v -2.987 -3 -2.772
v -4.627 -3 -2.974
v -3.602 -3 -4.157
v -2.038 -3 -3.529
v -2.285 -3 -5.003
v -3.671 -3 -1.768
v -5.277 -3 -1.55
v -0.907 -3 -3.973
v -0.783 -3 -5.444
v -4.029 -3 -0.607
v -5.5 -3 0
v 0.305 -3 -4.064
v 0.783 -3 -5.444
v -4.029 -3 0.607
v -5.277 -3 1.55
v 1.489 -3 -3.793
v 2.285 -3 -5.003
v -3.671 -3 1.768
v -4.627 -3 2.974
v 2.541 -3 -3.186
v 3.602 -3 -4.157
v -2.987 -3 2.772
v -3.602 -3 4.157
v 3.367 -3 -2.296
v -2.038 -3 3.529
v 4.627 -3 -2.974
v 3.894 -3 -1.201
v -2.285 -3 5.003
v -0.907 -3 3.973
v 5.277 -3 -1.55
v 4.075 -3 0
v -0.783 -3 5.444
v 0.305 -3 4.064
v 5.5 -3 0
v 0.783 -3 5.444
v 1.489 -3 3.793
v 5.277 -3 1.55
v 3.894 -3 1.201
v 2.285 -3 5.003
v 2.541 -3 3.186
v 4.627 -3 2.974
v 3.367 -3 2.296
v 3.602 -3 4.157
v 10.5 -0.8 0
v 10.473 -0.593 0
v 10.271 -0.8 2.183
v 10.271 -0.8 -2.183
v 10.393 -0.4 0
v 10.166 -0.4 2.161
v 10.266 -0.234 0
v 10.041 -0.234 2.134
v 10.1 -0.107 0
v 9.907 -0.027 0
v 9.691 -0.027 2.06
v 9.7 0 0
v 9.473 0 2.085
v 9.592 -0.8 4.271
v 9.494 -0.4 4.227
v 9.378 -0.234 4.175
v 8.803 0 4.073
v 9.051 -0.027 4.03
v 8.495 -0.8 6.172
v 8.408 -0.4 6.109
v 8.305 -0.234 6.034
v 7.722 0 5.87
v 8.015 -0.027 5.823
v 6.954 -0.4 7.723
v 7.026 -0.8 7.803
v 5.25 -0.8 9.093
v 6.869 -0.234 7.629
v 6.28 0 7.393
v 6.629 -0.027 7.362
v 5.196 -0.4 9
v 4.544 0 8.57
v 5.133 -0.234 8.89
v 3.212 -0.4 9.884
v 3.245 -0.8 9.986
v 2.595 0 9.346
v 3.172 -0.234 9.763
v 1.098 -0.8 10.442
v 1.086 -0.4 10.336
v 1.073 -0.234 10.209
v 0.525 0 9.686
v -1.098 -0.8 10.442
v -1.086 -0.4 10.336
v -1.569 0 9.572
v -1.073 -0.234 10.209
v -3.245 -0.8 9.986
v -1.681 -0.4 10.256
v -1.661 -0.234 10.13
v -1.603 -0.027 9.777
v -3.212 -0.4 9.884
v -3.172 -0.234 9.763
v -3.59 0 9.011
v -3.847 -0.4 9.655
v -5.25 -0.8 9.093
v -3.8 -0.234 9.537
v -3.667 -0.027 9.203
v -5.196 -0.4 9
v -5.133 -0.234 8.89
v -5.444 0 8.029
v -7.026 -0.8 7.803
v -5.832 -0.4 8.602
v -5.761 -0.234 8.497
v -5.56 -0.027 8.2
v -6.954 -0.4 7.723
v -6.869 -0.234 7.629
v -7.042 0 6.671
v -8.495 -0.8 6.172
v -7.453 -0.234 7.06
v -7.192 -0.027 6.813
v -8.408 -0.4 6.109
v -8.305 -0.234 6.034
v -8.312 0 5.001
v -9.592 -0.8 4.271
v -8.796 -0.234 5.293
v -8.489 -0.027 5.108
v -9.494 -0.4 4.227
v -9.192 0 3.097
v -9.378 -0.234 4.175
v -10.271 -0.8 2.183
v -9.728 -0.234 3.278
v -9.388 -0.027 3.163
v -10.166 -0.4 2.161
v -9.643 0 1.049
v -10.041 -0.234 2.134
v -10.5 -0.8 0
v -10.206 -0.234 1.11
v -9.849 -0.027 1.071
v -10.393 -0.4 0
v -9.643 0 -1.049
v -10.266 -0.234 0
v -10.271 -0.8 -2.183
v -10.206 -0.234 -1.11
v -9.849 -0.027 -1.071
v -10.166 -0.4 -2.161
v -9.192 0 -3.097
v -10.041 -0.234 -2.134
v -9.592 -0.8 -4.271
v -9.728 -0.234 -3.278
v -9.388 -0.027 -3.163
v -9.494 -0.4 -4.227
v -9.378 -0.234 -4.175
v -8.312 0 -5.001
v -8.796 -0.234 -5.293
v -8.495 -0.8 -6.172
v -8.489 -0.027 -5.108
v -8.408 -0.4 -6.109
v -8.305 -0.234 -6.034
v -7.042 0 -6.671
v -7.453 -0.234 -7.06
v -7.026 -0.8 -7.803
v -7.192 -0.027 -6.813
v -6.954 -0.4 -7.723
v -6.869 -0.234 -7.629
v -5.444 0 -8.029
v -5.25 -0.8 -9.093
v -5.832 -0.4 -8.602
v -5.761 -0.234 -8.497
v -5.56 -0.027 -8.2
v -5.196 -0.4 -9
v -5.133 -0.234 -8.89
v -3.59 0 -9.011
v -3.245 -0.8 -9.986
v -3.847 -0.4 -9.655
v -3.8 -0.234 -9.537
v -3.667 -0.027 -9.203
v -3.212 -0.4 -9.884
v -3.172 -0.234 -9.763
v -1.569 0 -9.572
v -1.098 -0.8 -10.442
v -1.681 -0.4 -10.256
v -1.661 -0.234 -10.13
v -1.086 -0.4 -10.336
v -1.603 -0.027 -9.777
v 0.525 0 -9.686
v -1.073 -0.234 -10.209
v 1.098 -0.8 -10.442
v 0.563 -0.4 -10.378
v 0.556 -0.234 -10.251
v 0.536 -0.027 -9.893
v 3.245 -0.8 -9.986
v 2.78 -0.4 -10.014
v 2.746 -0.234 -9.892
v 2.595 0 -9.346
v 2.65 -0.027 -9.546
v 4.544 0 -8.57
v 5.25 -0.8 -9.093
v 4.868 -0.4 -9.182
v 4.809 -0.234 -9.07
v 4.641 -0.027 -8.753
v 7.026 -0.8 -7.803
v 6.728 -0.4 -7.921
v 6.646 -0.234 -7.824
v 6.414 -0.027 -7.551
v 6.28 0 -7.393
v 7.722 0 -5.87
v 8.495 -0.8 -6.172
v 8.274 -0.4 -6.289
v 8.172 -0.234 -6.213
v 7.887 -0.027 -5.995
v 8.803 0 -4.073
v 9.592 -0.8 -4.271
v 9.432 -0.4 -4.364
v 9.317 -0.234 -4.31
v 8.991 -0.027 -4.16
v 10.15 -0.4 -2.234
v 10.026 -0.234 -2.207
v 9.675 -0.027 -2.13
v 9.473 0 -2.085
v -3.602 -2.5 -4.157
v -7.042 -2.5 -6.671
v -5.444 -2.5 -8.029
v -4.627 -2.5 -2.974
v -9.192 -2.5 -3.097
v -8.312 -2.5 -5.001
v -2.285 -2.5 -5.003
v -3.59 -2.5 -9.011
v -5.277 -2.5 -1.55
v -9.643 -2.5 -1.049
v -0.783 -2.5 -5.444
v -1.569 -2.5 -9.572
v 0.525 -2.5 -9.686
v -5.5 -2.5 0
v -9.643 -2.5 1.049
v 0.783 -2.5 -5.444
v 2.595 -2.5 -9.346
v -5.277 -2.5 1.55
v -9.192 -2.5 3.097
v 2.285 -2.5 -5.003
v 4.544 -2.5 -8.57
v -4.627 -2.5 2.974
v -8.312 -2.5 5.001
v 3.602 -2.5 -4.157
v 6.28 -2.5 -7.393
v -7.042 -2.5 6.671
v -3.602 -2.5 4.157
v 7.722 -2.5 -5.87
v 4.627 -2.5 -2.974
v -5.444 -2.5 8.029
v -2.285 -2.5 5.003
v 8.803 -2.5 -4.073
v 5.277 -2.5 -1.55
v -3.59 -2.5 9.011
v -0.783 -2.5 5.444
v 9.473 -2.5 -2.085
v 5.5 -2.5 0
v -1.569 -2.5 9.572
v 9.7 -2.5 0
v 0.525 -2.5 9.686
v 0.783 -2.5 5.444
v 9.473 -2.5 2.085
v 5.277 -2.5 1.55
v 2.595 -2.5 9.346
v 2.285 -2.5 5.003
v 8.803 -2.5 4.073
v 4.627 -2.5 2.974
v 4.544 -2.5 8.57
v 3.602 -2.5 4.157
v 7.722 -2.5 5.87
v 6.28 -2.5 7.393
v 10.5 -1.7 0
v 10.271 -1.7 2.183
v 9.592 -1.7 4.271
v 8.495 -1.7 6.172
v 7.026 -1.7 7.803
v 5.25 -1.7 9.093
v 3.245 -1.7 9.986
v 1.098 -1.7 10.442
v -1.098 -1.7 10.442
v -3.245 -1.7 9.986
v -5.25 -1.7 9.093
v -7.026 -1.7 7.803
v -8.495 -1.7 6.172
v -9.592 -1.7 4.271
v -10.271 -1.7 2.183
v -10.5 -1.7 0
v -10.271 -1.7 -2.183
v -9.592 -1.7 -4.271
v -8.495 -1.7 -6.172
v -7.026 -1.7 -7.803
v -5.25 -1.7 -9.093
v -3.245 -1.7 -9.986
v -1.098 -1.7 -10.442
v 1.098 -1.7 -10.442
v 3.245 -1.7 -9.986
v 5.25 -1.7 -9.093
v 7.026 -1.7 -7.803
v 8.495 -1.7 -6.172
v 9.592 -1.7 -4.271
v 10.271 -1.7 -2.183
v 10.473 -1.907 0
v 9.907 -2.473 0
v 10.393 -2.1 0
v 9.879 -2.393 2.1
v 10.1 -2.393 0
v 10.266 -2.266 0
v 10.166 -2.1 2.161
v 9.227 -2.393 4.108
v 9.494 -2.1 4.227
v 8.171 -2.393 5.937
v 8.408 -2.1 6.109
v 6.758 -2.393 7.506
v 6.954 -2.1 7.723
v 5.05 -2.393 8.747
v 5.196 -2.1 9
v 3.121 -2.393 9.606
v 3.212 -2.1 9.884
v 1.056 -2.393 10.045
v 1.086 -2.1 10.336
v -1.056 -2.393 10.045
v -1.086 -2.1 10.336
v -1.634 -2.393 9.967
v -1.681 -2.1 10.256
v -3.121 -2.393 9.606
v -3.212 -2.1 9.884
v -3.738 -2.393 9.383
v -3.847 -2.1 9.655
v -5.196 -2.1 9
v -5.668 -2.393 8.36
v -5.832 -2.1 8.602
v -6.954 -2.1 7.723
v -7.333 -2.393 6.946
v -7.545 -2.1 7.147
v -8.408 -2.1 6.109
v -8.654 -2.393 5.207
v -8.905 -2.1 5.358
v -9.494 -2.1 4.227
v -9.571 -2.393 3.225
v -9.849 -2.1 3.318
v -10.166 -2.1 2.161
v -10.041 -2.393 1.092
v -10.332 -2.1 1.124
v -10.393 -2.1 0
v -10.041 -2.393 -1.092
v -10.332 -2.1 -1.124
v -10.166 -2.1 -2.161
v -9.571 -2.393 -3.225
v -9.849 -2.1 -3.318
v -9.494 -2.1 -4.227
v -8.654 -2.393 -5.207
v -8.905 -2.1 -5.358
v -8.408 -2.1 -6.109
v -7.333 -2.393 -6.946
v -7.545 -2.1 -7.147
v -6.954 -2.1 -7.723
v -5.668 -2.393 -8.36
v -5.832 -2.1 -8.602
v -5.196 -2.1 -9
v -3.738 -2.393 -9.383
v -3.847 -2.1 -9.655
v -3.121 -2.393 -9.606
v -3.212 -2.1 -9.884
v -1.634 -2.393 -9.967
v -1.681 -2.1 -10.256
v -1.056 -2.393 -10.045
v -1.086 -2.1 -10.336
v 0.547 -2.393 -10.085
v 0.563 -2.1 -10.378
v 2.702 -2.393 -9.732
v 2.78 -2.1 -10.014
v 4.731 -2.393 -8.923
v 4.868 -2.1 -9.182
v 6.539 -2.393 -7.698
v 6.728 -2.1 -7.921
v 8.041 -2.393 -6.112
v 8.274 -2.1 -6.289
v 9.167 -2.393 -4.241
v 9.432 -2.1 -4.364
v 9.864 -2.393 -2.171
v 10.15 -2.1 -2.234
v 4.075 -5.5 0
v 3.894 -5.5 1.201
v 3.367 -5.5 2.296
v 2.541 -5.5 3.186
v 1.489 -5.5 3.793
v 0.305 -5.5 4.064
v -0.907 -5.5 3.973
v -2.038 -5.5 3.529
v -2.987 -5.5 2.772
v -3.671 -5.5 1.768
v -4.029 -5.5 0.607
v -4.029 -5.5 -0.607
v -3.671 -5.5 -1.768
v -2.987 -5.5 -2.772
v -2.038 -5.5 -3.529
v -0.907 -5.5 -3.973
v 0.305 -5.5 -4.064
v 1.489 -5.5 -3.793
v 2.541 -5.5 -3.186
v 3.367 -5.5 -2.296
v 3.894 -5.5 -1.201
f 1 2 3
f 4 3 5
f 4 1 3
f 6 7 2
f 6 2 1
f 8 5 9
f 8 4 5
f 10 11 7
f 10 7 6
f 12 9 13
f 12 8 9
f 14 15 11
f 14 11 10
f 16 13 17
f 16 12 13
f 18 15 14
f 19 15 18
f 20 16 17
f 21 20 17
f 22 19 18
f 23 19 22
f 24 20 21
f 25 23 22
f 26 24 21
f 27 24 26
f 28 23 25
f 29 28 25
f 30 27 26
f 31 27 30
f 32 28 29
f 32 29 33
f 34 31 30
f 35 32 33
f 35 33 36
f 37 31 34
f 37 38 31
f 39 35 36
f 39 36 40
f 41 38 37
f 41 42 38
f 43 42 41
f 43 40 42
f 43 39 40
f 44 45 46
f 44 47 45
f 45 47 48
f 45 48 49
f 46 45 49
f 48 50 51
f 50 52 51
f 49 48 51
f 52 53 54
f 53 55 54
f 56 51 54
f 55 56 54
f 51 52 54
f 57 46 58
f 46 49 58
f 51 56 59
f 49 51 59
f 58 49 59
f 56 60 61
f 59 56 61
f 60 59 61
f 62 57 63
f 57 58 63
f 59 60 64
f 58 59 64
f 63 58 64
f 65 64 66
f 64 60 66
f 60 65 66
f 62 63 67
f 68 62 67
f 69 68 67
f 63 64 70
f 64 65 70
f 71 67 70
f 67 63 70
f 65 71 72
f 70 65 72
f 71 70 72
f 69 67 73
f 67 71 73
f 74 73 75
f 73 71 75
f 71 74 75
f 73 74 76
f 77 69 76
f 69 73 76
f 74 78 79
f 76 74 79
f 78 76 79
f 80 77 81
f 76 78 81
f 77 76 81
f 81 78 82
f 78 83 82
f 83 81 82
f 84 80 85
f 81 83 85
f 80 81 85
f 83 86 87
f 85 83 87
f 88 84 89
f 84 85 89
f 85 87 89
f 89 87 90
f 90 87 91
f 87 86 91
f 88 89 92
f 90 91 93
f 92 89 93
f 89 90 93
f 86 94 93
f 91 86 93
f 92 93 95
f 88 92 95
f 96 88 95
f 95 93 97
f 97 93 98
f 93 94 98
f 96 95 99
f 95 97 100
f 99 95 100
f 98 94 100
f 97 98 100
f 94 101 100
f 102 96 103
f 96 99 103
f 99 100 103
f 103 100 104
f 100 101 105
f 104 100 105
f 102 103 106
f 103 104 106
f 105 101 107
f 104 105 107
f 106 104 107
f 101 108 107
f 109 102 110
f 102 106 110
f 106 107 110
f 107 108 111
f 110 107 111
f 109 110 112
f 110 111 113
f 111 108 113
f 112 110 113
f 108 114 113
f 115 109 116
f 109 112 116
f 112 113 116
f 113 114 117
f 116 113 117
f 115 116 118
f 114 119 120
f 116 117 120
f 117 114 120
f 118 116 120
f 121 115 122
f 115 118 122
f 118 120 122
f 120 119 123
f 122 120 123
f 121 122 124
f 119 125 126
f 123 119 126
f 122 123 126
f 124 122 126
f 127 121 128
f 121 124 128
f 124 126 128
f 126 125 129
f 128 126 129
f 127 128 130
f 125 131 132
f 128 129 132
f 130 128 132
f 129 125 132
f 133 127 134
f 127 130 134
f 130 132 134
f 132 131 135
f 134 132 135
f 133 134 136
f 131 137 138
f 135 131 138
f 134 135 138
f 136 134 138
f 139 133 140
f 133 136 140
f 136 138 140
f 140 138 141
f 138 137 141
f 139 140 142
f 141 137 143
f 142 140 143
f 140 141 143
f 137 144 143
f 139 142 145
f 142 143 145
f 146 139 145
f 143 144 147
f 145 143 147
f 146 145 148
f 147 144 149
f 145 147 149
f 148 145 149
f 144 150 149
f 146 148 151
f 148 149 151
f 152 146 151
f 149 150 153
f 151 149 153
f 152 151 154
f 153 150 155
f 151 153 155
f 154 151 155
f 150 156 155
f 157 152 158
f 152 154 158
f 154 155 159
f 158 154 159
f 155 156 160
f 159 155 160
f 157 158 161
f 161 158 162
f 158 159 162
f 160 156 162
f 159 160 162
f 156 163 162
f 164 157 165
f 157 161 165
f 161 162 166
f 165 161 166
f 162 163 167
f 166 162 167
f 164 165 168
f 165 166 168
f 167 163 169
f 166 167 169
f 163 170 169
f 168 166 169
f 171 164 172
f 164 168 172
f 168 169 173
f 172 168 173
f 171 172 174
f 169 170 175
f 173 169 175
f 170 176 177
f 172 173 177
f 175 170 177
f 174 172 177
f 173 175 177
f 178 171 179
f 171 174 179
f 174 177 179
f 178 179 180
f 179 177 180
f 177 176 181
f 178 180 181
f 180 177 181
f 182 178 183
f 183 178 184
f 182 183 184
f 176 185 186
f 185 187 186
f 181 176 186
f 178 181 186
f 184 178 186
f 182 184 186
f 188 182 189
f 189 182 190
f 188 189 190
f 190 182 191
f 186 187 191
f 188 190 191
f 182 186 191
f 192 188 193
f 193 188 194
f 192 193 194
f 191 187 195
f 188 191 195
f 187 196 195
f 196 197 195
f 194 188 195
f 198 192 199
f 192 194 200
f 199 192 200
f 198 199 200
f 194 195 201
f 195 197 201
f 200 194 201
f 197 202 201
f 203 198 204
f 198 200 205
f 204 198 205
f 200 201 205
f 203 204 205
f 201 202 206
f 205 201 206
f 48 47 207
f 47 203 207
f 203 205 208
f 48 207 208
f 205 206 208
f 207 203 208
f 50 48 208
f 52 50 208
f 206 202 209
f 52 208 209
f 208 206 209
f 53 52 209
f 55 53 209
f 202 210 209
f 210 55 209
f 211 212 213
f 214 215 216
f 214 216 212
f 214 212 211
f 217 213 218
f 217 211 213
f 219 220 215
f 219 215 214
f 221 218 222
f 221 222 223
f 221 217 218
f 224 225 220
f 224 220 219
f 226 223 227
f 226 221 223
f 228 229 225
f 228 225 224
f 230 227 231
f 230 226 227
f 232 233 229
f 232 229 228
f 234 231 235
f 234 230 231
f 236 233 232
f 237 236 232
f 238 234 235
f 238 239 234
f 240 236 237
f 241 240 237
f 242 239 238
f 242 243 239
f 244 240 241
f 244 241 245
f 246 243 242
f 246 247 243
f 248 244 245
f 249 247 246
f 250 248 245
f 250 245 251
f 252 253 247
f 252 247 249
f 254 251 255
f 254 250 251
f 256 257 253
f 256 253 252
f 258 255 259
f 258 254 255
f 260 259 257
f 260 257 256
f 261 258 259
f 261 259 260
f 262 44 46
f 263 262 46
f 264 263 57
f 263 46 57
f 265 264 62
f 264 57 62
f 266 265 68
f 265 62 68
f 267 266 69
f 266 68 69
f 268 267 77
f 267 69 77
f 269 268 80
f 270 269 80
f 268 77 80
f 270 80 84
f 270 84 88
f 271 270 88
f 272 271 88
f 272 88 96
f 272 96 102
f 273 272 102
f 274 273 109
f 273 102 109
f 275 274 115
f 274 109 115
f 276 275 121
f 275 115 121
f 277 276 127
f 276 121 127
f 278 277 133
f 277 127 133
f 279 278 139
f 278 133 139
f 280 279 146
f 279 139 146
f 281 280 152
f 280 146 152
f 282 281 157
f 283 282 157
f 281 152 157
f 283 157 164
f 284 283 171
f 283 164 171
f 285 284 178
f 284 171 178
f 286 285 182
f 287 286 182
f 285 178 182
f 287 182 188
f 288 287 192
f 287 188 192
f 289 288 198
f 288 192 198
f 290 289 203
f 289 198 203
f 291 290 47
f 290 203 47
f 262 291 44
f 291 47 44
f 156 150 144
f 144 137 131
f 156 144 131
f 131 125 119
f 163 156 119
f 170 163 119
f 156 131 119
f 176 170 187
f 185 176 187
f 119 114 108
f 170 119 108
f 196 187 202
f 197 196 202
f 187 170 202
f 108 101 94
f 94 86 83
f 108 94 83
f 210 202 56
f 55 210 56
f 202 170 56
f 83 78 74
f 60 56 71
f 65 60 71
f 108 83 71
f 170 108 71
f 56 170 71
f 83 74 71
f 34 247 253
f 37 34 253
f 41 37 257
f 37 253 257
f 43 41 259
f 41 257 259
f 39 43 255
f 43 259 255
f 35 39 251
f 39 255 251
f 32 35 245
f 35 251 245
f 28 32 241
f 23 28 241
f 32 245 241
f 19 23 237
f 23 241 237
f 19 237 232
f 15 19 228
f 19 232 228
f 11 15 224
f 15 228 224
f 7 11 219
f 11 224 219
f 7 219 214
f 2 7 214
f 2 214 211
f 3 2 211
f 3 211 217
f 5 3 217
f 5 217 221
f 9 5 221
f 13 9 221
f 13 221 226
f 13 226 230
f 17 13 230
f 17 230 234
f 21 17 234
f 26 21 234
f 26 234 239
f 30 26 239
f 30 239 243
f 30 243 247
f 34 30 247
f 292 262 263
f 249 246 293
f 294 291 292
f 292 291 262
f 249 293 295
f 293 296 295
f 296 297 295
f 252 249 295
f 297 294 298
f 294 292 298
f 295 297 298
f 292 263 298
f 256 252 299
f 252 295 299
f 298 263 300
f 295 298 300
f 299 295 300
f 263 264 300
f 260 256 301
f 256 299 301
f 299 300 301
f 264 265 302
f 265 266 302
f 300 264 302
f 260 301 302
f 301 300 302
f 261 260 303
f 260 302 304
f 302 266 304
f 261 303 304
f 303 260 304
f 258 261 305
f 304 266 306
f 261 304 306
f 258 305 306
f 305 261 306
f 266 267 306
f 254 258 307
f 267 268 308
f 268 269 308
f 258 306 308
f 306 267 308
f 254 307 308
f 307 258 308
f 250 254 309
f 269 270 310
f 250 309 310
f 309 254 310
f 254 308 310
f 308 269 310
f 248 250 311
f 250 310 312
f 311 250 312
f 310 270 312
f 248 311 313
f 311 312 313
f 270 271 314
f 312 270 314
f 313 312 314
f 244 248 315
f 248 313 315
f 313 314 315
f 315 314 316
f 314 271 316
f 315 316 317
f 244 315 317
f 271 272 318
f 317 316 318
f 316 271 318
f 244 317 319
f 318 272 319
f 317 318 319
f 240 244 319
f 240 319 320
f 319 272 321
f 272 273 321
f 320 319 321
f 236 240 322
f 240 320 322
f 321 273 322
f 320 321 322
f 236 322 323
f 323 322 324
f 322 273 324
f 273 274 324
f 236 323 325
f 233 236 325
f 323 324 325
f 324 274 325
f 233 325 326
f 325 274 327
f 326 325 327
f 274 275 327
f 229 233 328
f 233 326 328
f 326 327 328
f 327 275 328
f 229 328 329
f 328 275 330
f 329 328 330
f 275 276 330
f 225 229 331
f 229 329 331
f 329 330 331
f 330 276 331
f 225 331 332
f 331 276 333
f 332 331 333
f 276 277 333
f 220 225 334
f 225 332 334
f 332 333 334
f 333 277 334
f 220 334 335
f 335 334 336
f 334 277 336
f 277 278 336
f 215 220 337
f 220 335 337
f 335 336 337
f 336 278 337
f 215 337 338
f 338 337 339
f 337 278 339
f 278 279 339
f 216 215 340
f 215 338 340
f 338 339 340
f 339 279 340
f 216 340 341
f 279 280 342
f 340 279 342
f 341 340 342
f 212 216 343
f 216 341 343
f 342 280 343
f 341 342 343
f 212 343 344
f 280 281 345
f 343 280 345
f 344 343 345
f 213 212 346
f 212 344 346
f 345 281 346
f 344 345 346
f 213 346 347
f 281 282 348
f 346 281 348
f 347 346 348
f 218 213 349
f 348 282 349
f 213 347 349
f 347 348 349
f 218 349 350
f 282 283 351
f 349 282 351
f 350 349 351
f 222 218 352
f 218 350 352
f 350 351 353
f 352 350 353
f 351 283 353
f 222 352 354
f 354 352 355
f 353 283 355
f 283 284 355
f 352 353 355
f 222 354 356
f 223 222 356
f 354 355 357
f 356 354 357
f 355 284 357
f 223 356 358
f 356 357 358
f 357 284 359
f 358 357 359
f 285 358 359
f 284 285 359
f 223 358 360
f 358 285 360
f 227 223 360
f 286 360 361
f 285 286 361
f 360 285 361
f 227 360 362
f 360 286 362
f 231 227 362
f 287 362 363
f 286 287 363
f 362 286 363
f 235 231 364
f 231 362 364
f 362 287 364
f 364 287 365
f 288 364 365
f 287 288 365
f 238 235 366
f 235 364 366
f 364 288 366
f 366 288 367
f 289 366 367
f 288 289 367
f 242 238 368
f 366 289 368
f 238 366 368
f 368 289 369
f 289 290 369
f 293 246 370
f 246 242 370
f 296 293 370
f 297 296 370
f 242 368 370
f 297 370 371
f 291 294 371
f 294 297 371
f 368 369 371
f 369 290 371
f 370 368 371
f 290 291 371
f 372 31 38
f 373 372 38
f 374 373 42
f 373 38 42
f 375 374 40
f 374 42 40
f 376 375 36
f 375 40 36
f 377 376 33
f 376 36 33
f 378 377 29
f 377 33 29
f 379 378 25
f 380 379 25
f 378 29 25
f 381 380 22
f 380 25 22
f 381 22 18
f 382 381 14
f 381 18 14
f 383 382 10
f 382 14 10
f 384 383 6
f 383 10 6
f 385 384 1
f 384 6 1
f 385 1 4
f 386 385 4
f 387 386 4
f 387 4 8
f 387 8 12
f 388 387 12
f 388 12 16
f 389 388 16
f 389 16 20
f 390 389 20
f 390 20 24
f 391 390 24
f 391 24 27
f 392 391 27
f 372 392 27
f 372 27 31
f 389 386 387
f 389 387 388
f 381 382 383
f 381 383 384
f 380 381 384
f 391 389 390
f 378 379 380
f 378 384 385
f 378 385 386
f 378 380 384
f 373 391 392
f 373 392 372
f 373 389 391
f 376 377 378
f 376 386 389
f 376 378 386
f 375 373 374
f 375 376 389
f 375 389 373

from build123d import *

# Parameters (mm, degrees)
F0_R     = 10.5
F0_R_2   = 5.5
F2_DEPTH = 2.5
F1_R     = 5.5
F1_R_2   = 4.075
F3_DEPTH = 3
F4_DEPTH = 5.5
F5_R     = 0.8


with BuildPart() as f2:
    # F0 (on Front) → F2 (new body)
    with BuildSketch(Plane.XZ):
        Circle(F0_R)
        Circle(F0_R_2, mode=Mode.SUBTRACT)
    extrude(amount=F2_DEPTH)

    # F1 (on face) → F3 (join)
    with BuildSketch(Plane.XZ):
        Circle(F1_R)
        Circle(F1_R_2, mode=Mode.SUBTRACT)
    extrude(amount=F3_DEPTH)

    # F1 (on face) → F4 (join)
    with BuildSketch(Plane.XZ):
        Circle(F1_R_2)
    extrude(amount=F4_DEPTH)

    # F5
    f5_edges = [f2.edges().sort_by_distance(p)[0] for p in [
        (-10.5, 0, 0),
        (-10.5, -2.5, 0),
    ]]
    fillet(f5_edges, radius=F5_R)


solid = f2.part
